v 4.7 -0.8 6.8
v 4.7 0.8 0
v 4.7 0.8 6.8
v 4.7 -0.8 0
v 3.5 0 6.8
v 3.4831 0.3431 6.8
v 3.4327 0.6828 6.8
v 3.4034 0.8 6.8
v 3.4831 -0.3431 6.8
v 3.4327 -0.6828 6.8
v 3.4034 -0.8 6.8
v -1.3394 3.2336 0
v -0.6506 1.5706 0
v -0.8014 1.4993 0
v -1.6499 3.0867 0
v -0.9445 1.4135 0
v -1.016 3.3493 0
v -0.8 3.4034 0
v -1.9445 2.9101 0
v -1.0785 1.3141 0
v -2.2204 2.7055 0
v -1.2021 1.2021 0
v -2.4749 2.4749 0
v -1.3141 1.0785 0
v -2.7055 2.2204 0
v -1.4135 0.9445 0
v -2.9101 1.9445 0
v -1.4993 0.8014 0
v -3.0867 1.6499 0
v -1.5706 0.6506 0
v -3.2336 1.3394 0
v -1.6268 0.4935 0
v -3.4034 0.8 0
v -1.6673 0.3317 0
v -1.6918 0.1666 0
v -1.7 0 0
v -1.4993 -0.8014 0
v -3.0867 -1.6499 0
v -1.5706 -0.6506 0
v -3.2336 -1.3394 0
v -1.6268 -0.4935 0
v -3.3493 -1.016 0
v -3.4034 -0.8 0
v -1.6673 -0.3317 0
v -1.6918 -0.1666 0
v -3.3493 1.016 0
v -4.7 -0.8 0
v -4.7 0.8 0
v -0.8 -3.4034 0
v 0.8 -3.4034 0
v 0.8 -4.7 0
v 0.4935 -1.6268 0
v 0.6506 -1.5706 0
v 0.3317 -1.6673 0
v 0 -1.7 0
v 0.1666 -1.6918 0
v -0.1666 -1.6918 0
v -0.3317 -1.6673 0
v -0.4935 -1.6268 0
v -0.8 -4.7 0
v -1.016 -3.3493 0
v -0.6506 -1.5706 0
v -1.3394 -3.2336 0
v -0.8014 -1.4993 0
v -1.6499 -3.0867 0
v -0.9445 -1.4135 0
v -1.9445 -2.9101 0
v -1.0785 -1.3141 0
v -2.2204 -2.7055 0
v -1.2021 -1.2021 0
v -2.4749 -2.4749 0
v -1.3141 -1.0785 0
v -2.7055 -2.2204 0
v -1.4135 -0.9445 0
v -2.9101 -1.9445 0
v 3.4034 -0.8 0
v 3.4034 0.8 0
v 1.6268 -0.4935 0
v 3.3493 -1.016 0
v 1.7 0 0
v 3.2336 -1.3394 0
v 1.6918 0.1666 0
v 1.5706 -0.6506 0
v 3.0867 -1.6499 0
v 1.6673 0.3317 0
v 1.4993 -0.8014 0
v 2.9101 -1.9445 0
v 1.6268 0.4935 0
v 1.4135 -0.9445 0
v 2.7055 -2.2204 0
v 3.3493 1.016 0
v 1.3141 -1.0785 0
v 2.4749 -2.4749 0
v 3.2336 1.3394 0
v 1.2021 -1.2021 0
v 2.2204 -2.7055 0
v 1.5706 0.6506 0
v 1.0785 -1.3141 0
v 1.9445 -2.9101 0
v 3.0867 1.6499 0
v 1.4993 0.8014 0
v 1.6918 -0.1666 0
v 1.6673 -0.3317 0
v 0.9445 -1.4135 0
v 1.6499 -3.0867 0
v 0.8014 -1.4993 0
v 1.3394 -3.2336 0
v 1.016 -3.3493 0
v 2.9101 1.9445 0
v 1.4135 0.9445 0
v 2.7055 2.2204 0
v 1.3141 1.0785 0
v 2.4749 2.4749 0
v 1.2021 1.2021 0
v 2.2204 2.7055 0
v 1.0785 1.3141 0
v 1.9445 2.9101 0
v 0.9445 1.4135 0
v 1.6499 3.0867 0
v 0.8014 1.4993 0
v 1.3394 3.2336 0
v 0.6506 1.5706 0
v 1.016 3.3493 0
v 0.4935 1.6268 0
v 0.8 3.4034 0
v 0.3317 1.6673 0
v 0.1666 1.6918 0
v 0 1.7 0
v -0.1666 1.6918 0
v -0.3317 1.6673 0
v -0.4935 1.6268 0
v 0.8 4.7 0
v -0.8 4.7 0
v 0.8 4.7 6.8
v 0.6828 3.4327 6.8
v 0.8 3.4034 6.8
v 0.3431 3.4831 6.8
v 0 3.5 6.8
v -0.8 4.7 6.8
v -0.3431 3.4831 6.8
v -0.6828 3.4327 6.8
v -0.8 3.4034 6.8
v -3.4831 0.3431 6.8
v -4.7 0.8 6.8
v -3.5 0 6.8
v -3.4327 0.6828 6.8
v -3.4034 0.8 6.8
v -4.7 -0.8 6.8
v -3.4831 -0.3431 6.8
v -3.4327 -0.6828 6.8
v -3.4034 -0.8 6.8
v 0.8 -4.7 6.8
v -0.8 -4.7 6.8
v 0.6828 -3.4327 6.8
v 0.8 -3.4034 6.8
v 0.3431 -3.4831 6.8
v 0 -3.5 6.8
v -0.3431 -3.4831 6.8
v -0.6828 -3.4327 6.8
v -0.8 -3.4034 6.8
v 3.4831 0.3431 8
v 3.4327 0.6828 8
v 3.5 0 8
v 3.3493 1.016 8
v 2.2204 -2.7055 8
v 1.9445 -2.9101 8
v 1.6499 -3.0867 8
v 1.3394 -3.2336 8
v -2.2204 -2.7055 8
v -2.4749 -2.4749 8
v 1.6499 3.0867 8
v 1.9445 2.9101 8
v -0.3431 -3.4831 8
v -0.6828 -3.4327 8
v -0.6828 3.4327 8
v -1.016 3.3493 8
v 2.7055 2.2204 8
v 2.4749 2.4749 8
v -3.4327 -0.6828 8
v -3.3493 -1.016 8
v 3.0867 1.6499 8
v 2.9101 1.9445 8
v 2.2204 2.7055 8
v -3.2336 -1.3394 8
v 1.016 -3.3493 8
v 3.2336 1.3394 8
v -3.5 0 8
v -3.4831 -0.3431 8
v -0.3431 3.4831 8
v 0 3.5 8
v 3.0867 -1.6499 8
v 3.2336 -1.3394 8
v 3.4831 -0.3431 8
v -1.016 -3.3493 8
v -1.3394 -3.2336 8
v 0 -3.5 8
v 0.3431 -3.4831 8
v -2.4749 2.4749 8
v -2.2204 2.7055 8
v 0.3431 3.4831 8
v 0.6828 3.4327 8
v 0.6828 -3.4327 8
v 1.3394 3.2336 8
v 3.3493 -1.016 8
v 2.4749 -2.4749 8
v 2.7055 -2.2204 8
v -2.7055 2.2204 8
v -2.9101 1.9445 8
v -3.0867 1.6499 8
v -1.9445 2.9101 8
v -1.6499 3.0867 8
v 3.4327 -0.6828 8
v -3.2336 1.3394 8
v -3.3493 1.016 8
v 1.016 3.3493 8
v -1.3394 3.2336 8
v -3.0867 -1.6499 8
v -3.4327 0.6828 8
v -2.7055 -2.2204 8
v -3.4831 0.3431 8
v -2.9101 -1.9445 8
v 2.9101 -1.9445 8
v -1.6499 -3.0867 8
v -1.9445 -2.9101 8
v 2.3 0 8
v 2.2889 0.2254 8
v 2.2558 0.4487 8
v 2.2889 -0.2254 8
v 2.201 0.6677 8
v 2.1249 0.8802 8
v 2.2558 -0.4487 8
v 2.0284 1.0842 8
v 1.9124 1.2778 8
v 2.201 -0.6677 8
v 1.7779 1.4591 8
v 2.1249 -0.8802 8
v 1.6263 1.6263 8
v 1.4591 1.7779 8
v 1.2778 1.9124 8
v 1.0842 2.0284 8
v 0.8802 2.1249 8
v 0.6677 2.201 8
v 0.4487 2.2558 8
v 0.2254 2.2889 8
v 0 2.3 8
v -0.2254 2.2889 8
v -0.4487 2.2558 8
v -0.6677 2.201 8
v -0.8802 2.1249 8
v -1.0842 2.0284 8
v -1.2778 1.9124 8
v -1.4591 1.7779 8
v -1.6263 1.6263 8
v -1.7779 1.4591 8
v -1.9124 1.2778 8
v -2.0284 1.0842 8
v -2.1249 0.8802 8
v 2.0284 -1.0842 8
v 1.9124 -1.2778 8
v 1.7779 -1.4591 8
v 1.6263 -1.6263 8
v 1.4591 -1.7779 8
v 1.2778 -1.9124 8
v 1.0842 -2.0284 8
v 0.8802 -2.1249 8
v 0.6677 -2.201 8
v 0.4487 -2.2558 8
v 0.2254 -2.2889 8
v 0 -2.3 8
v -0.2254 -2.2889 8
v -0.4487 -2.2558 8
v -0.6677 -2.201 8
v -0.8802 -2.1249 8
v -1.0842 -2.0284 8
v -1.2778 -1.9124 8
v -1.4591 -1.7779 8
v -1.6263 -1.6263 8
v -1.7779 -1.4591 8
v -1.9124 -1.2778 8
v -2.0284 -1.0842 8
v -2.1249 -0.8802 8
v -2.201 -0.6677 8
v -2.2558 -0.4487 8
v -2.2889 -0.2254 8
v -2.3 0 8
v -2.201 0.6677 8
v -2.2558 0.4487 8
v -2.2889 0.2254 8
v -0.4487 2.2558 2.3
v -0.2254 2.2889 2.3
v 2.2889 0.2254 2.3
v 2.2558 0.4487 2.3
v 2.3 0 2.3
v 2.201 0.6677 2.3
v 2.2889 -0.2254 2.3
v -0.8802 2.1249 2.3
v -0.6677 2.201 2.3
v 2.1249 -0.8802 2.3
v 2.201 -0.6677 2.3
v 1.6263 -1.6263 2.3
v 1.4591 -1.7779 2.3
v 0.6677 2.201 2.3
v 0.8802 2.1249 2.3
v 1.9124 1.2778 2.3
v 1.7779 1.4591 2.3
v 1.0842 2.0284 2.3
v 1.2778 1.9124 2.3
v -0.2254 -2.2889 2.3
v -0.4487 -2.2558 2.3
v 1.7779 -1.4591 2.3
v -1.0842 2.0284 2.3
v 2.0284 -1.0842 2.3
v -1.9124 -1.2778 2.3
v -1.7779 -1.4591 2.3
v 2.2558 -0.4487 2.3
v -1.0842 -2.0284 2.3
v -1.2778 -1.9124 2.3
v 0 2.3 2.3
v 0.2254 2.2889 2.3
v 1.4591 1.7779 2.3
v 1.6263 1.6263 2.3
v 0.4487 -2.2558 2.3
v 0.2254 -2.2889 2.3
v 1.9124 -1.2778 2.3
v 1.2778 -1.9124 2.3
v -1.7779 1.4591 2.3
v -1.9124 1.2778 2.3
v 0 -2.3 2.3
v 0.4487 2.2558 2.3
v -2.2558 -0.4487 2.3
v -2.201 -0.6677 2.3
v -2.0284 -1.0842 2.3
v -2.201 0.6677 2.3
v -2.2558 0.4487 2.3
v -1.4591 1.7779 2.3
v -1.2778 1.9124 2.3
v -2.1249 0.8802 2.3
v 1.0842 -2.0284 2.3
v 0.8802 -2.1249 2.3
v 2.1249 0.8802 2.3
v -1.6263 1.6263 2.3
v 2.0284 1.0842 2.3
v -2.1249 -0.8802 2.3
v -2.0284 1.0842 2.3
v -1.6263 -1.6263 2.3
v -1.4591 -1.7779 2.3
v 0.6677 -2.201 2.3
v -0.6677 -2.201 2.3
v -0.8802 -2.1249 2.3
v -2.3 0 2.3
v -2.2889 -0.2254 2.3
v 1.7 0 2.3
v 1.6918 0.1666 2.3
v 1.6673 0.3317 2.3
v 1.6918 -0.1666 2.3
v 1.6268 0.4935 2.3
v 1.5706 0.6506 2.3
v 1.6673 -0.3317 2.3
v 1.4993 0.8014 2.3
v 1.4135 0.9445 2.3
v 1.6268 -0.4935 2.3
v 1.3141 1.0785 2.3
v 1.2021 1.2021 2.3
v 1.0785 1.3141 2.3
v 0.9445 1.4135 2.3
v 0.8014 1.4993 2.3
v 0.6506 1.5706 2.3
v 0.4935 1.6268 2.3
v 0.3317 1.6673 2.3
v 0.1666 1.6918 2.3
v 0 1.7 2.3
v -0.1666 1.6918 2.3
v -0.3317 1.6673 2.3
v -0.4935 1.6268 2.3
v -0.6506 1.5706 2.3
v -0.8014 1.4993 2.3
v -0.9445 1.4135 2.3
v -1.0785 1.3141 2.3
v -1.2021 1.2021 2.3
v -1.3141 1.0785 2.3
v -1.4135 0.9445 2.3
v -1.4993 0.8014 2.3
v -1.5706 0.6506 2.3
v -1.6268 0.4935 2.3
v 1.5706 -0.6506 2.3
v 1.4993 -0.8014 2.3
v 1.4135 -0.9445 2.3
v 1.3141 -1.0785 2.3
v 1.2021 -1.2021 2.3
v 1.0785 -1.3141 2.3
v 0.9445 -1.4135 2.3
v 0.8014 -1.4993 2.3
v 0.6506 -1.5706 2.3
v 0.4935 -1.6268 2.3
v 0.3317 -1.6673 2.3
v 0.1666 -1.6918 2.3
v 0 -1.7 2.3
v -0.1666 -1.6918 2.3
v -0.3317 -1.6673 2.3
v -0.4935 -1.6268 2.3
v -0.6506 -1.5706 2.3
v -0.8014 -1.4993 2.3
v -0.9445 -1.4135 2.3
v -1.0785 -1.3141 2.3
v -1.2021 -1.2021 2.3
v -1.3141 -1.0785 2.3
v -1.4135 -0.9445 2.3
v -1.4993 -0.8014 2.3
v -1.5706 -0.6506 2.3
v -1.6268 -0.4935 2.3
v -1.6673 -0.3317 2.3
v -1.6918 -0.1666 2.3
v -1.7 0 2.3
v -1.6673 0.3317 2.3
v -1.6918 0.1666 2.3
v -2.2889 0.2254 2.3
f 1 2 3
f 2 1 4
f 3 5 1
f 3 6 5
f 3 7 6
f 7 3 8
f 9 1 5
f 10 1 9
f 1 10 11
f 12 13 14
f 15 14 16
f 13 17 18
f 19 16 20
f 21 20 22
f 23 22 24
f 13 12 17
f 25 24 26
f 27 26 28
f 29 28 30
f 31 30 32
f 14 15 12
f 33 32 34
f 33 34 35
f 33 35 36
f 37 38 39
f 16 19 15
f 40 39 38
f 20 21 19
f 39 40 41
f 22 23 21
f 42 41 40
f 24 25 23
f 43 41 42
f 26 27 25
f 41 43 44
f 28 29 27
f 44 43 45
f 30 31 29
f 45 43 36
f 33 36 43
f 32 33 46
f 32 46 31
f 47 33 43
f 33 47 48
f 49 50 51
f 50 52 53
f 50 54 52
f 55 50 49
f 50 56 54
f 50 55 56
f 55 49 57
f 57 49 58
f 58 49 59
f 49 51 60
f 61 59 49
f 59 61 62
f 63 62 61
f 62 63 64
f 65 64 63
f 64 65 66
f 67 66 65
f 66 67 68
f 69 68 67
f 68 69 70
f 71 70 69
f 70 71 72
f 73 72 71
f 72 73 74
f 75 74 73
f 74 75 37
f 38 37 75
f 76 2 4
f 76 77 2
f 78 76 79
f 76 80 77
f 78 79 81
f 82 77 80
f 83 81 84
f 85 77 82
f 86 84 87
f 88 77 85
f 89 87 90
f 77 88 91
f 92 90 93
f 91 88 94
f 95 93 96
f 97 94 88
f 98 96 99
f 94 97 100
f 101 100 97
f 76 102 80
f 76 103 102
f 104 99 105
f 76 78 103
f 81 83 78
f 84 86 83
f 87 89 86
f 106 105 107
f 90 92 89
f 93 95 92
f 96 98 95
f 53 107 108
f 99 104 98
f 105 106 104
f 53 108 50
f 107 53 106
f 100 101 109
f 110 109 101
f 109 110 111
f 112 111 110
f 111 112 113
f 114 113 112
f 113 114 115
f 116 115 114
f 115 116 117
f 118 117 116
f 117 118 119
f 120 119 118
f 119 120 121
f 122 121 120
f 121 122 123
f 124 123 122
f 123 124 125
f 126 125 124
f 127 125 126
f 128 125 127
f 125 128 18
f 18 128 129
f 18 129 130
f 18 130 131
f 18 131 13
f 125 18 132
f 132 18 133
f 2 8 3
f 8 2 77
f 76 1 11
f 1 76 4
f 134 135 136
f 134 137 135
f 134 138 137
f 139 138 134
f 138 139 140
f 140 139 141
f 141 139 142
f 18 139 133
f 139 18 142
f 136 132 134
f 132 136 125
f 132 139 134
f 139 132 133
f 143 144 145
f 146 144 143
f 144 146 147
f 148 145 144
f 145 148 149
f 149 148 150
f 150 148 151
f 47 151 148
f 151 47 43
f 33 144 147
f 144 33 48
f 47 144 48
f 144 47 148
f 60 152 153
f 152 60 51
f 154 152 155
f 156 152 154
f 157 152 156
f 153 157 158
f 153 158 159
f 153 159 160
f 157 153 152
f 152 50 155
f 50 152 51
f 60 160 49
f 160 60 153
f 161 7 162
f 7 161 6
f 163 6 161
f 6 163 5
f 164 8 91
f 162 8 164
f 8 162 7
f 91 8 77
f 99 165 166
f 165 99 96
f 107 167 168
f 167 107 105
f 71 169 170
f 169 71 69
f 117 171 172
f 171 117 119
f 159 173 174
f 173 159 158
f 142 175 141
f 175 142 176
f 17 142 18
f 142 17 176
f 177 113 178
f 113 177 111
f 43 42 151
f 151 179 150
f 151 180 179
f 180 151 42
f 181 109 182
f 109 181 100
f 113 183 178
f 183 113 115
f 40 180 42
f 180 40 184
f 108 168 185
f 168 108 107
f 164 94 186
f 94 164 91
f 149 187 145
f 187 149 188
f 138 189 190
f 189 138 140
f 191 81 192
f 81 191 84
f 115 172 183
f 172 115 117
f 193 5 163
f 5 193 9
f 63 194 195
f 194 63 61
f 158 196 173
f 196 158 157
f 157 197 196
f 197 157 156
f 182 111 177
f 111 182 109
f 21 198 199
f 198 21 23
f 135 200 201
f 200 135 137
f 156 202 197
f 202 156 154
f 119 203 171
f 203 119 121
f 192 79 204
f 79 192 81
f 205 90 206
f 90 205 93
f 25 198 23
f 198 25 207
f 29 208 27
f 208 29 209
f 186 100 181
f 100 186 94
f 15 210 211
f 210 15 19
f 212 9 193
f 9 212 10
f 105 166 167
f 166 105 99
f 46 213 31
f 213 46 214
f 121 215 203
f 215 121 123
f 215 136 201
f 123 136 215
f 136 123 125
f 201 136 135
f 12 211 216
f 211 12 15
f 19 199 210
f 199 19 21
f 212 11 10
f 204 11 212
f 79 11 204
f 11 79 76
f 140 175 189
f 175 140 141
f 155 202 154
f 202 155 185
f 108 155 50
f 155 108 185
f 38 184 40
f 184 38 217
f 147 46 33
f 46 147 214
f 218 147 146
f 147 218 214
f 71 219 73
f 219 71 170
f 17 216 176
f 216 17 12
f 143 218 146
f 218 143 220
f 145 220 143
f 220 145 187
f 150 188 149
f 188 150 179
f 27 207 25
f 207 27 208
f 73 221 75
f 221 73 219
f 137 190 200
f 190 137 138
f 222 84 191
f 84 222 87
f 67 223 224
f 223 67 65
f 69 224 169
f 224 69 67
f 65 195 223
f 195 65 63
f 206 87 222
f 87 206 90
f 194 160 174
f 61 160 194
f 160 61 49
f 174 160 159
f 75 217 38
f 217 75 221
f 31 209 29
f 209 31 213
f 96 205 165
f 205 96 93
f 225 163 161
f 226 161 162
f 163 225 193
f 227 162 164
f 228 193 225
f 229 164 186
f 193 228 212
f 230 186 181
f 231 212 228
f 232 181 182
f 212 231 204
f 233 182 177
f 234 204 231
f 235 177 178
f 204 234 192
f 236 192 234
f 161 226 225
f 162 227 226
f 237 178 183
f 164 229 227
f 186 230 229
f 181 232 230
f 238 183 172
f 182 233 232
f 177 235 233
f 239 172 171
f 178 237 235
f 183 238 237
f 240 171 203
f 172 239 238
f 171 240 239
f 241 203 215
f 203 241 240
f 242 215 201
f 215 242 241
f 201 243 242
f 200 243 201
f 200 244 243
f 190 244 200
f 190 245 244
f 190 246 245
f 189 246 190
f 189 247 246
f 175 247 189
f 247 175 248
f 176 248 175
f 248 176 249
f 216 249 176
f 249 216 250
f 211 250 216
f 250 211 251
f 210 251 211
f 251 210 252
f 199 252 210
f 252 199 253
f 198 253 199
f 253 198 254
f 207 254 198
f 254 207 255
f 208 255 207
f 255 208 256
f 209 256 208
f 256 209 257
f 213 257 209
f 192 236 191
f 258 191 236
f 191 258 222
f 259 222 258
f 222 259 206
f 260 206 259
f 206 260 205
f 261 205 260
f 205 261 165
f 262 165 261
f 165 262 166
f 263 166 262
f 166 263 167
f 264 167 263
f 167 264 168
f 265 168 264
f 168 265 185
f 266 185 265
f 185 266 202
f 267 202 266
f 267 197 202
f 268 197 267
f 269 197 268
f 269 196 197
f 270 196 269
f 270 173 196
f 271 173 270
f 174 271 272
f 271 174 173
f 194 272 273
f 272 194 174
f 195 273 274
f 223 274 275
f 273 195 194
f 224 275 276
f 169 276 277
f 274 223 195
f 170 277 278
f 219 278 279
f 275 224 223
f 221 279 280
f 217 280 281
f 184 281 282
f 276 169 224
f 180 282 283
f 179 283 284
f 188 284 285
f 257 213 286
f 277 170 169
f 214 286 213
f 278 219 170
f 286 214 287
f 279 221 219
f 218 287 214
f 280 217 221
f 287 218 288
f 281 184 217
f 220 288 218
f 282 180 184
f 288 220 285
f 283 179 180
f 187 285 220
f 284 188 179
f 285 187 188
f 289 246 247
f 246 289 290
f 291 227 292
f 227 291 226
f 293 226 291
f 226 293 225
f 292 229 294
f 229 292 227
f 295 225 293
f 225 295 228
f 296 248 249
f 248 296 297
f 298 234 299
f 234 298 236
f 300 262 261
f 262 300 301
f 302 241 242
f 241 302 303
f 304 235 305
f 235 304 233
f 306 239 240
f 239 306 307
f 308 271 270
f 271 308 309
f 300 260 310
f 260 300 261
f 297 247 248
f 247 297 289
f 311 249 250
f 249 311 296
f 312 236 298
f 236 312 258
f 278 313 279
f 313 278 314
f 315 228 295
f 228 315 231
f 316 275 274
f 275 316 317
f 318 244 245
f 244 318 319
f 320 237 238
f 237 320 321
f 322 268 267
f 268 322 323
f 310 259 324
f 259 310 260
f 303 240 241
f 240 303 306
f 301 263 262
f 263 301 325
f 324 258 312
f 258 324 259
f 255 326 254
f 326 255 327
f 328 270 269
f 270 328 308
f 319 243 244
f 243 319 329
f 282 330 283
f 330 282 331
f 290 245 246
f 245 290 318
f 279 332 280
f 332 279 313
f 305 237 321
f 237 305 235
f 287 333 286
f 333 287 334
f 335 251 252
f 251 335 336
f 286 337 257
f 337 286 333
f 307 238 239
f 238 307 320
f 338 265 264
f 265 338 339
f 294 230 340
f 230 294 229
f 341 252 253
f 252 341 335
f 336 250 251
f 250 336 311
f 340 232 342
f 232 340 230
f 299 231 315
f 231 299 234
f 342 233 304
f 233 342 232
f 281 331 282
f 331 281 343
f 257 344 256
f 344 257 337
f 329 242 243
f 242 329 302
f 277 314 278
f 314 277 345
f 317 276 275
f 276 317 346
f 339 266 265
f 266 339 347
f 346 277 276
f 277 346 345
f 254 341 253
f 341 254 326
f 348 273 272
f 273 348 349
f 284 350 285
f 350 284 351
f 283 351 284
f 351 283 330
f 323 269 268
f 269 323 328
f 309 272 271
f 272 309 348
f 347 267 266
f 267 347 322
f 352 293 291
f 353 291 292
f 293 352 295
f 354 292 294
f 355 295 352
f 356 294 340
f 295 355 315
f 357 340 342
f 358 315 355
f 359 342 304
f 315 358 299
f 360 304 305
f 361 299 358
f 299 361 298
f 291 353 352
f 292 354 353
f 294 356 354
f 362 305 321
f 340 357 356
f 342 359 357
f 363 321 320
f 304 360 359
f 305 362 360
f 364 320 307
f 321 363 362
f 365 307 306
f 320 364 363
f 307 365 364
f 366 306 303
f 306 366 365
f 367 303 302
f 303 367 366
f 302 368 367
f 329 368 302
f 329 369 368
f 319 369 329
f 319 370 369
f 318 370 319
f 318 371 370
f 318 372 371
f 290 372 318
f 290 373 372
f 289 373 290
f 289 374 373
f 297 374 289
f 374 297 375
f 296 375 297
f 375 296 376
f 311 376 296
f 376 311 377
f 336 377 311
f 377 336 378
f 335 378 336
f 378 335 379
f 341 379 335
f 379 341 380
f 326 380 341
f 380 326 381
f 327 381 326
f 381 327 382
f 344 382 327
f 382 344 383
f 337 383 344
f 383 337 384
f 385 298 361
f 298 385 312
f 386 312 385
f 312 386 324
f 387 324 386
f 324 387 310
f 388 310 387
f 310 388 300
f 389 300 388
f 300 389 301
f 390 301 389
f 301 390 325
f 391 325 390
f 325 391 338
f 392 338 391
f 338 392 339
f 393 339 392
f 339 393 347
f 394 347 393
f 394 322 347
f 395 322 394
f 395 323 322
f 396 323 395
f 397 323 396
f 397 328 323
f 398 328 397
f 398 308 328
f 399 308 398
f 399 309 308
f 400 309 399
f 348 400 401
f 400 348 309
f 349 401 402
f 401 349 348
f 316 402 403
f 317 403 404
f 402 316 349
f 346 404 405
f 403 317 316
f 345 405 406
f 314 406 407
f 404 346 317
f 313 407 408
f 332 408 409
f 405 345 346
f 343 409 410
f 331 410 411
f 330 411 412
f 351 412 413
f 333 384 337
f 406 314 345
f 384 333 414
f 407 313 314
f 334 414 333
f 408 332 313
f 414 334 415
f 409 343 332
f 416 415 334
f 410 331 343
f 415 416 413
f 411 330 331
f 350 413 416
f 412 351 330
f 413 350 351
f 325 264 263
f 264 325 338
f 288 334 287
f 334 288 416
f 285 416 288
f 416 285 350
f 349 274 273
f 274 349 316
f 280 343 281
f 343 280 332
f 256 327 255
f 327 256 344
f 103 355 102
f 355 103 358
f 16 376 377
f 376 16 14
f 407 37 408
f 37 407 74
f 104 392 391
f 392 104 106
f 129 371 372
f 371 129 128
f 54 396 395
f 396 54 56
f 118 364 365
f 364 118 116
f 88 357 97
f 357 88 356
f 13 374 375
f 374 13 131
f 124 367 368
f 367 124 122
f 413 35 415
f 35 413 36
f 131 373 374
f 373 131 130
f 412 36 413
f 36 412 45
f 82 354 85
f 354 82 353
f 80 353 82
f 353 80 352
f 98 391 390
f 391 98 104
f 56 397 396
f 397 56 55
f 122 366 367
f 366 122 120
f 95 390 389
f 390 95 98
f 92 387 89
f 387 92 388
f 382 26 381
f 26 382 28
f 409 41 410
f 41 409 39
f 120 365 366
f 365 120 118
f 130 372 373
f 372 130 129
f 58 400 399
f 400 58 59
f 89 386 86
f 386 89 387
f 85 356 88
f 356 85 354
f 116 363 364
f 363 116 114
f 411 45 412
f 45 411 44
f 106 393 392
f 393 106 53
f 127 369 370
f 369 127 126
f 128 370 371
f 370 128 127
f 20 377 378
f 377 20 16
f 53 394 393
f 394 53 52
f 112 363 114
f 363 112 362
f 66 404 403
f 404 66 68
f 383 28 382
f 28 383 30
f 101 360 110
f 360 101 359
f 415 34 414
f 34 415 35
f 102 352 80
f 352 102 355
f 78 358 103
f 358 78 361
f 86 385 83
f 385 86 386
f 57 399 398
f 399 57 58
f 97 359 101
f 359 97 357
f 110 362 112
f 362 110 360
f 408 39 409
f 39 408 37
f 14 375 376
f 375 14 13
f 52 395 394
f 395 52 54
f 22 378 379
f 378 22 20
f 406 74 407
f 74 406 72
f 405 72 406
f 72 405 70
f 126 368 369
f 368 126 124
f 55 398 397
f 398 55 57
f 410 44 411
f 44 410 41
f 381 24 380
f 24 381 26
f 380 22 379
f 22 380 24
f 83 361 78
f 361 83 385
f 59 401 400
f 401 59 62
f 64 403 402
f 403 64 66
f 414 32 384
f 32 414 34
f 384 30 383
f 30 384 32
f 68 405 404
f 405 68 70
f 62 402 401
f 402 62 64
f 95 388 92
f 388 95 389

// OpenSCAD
// M3 heat-set insert boss (Ruthex / Voron style) — parametric, millimetres.
// Insert seat is dimensioned for a standard M3 x 5.7 mm brass insert.
// Good first issue: add a `shell_thickness` guard that warns below 1.2 mm.

$fn = 64;

boss_od      = 7.0;   // outer diameter of the boss
boss_height  = 8.0;   // total boss height (must exceed insert depth)
insert_od    = 4.6;   // heat-set insert barrel diameter + 0.2 mm
insert_depth = 5.7;   // insert length + 0.1 mm
pilot_d      = 3.4;   // M3 pilot / screw shaft clearance

rib_count    = 4;
rib_length   = 2.4;
rib_width    = 1.6;
rib_height   = 1.2;

module boss_body() {
    cylinder(d = boss_od, h = boss_height);
}

module insert_seat() {
    translate([0, 0, boss_height - insert_depth])
        cylinder(d = insert_od, h = insert_depth + 0.1);
}

module pilot_bore() {
    translate([0, 0, -0.1])
        cylinder(d = pilot_d, h = boss_height + 0.2);
}

module ribs() {
    for (a = [0 : 360 / rib_count : 359])
        rotate([0, 0, a])
            translate([boss_od / 2 - rib_length / 2, -rib_width / 2, 0])
                cube([rib_length, rib_width, boss_height - rib_height]);
}

module m3_heatset_boss() {
    difference() {
        union() {
            boss_body();
            ribs();
        }
        insert_seat();
        pilot_bore();
    }
}

m3_heatset_boss();
